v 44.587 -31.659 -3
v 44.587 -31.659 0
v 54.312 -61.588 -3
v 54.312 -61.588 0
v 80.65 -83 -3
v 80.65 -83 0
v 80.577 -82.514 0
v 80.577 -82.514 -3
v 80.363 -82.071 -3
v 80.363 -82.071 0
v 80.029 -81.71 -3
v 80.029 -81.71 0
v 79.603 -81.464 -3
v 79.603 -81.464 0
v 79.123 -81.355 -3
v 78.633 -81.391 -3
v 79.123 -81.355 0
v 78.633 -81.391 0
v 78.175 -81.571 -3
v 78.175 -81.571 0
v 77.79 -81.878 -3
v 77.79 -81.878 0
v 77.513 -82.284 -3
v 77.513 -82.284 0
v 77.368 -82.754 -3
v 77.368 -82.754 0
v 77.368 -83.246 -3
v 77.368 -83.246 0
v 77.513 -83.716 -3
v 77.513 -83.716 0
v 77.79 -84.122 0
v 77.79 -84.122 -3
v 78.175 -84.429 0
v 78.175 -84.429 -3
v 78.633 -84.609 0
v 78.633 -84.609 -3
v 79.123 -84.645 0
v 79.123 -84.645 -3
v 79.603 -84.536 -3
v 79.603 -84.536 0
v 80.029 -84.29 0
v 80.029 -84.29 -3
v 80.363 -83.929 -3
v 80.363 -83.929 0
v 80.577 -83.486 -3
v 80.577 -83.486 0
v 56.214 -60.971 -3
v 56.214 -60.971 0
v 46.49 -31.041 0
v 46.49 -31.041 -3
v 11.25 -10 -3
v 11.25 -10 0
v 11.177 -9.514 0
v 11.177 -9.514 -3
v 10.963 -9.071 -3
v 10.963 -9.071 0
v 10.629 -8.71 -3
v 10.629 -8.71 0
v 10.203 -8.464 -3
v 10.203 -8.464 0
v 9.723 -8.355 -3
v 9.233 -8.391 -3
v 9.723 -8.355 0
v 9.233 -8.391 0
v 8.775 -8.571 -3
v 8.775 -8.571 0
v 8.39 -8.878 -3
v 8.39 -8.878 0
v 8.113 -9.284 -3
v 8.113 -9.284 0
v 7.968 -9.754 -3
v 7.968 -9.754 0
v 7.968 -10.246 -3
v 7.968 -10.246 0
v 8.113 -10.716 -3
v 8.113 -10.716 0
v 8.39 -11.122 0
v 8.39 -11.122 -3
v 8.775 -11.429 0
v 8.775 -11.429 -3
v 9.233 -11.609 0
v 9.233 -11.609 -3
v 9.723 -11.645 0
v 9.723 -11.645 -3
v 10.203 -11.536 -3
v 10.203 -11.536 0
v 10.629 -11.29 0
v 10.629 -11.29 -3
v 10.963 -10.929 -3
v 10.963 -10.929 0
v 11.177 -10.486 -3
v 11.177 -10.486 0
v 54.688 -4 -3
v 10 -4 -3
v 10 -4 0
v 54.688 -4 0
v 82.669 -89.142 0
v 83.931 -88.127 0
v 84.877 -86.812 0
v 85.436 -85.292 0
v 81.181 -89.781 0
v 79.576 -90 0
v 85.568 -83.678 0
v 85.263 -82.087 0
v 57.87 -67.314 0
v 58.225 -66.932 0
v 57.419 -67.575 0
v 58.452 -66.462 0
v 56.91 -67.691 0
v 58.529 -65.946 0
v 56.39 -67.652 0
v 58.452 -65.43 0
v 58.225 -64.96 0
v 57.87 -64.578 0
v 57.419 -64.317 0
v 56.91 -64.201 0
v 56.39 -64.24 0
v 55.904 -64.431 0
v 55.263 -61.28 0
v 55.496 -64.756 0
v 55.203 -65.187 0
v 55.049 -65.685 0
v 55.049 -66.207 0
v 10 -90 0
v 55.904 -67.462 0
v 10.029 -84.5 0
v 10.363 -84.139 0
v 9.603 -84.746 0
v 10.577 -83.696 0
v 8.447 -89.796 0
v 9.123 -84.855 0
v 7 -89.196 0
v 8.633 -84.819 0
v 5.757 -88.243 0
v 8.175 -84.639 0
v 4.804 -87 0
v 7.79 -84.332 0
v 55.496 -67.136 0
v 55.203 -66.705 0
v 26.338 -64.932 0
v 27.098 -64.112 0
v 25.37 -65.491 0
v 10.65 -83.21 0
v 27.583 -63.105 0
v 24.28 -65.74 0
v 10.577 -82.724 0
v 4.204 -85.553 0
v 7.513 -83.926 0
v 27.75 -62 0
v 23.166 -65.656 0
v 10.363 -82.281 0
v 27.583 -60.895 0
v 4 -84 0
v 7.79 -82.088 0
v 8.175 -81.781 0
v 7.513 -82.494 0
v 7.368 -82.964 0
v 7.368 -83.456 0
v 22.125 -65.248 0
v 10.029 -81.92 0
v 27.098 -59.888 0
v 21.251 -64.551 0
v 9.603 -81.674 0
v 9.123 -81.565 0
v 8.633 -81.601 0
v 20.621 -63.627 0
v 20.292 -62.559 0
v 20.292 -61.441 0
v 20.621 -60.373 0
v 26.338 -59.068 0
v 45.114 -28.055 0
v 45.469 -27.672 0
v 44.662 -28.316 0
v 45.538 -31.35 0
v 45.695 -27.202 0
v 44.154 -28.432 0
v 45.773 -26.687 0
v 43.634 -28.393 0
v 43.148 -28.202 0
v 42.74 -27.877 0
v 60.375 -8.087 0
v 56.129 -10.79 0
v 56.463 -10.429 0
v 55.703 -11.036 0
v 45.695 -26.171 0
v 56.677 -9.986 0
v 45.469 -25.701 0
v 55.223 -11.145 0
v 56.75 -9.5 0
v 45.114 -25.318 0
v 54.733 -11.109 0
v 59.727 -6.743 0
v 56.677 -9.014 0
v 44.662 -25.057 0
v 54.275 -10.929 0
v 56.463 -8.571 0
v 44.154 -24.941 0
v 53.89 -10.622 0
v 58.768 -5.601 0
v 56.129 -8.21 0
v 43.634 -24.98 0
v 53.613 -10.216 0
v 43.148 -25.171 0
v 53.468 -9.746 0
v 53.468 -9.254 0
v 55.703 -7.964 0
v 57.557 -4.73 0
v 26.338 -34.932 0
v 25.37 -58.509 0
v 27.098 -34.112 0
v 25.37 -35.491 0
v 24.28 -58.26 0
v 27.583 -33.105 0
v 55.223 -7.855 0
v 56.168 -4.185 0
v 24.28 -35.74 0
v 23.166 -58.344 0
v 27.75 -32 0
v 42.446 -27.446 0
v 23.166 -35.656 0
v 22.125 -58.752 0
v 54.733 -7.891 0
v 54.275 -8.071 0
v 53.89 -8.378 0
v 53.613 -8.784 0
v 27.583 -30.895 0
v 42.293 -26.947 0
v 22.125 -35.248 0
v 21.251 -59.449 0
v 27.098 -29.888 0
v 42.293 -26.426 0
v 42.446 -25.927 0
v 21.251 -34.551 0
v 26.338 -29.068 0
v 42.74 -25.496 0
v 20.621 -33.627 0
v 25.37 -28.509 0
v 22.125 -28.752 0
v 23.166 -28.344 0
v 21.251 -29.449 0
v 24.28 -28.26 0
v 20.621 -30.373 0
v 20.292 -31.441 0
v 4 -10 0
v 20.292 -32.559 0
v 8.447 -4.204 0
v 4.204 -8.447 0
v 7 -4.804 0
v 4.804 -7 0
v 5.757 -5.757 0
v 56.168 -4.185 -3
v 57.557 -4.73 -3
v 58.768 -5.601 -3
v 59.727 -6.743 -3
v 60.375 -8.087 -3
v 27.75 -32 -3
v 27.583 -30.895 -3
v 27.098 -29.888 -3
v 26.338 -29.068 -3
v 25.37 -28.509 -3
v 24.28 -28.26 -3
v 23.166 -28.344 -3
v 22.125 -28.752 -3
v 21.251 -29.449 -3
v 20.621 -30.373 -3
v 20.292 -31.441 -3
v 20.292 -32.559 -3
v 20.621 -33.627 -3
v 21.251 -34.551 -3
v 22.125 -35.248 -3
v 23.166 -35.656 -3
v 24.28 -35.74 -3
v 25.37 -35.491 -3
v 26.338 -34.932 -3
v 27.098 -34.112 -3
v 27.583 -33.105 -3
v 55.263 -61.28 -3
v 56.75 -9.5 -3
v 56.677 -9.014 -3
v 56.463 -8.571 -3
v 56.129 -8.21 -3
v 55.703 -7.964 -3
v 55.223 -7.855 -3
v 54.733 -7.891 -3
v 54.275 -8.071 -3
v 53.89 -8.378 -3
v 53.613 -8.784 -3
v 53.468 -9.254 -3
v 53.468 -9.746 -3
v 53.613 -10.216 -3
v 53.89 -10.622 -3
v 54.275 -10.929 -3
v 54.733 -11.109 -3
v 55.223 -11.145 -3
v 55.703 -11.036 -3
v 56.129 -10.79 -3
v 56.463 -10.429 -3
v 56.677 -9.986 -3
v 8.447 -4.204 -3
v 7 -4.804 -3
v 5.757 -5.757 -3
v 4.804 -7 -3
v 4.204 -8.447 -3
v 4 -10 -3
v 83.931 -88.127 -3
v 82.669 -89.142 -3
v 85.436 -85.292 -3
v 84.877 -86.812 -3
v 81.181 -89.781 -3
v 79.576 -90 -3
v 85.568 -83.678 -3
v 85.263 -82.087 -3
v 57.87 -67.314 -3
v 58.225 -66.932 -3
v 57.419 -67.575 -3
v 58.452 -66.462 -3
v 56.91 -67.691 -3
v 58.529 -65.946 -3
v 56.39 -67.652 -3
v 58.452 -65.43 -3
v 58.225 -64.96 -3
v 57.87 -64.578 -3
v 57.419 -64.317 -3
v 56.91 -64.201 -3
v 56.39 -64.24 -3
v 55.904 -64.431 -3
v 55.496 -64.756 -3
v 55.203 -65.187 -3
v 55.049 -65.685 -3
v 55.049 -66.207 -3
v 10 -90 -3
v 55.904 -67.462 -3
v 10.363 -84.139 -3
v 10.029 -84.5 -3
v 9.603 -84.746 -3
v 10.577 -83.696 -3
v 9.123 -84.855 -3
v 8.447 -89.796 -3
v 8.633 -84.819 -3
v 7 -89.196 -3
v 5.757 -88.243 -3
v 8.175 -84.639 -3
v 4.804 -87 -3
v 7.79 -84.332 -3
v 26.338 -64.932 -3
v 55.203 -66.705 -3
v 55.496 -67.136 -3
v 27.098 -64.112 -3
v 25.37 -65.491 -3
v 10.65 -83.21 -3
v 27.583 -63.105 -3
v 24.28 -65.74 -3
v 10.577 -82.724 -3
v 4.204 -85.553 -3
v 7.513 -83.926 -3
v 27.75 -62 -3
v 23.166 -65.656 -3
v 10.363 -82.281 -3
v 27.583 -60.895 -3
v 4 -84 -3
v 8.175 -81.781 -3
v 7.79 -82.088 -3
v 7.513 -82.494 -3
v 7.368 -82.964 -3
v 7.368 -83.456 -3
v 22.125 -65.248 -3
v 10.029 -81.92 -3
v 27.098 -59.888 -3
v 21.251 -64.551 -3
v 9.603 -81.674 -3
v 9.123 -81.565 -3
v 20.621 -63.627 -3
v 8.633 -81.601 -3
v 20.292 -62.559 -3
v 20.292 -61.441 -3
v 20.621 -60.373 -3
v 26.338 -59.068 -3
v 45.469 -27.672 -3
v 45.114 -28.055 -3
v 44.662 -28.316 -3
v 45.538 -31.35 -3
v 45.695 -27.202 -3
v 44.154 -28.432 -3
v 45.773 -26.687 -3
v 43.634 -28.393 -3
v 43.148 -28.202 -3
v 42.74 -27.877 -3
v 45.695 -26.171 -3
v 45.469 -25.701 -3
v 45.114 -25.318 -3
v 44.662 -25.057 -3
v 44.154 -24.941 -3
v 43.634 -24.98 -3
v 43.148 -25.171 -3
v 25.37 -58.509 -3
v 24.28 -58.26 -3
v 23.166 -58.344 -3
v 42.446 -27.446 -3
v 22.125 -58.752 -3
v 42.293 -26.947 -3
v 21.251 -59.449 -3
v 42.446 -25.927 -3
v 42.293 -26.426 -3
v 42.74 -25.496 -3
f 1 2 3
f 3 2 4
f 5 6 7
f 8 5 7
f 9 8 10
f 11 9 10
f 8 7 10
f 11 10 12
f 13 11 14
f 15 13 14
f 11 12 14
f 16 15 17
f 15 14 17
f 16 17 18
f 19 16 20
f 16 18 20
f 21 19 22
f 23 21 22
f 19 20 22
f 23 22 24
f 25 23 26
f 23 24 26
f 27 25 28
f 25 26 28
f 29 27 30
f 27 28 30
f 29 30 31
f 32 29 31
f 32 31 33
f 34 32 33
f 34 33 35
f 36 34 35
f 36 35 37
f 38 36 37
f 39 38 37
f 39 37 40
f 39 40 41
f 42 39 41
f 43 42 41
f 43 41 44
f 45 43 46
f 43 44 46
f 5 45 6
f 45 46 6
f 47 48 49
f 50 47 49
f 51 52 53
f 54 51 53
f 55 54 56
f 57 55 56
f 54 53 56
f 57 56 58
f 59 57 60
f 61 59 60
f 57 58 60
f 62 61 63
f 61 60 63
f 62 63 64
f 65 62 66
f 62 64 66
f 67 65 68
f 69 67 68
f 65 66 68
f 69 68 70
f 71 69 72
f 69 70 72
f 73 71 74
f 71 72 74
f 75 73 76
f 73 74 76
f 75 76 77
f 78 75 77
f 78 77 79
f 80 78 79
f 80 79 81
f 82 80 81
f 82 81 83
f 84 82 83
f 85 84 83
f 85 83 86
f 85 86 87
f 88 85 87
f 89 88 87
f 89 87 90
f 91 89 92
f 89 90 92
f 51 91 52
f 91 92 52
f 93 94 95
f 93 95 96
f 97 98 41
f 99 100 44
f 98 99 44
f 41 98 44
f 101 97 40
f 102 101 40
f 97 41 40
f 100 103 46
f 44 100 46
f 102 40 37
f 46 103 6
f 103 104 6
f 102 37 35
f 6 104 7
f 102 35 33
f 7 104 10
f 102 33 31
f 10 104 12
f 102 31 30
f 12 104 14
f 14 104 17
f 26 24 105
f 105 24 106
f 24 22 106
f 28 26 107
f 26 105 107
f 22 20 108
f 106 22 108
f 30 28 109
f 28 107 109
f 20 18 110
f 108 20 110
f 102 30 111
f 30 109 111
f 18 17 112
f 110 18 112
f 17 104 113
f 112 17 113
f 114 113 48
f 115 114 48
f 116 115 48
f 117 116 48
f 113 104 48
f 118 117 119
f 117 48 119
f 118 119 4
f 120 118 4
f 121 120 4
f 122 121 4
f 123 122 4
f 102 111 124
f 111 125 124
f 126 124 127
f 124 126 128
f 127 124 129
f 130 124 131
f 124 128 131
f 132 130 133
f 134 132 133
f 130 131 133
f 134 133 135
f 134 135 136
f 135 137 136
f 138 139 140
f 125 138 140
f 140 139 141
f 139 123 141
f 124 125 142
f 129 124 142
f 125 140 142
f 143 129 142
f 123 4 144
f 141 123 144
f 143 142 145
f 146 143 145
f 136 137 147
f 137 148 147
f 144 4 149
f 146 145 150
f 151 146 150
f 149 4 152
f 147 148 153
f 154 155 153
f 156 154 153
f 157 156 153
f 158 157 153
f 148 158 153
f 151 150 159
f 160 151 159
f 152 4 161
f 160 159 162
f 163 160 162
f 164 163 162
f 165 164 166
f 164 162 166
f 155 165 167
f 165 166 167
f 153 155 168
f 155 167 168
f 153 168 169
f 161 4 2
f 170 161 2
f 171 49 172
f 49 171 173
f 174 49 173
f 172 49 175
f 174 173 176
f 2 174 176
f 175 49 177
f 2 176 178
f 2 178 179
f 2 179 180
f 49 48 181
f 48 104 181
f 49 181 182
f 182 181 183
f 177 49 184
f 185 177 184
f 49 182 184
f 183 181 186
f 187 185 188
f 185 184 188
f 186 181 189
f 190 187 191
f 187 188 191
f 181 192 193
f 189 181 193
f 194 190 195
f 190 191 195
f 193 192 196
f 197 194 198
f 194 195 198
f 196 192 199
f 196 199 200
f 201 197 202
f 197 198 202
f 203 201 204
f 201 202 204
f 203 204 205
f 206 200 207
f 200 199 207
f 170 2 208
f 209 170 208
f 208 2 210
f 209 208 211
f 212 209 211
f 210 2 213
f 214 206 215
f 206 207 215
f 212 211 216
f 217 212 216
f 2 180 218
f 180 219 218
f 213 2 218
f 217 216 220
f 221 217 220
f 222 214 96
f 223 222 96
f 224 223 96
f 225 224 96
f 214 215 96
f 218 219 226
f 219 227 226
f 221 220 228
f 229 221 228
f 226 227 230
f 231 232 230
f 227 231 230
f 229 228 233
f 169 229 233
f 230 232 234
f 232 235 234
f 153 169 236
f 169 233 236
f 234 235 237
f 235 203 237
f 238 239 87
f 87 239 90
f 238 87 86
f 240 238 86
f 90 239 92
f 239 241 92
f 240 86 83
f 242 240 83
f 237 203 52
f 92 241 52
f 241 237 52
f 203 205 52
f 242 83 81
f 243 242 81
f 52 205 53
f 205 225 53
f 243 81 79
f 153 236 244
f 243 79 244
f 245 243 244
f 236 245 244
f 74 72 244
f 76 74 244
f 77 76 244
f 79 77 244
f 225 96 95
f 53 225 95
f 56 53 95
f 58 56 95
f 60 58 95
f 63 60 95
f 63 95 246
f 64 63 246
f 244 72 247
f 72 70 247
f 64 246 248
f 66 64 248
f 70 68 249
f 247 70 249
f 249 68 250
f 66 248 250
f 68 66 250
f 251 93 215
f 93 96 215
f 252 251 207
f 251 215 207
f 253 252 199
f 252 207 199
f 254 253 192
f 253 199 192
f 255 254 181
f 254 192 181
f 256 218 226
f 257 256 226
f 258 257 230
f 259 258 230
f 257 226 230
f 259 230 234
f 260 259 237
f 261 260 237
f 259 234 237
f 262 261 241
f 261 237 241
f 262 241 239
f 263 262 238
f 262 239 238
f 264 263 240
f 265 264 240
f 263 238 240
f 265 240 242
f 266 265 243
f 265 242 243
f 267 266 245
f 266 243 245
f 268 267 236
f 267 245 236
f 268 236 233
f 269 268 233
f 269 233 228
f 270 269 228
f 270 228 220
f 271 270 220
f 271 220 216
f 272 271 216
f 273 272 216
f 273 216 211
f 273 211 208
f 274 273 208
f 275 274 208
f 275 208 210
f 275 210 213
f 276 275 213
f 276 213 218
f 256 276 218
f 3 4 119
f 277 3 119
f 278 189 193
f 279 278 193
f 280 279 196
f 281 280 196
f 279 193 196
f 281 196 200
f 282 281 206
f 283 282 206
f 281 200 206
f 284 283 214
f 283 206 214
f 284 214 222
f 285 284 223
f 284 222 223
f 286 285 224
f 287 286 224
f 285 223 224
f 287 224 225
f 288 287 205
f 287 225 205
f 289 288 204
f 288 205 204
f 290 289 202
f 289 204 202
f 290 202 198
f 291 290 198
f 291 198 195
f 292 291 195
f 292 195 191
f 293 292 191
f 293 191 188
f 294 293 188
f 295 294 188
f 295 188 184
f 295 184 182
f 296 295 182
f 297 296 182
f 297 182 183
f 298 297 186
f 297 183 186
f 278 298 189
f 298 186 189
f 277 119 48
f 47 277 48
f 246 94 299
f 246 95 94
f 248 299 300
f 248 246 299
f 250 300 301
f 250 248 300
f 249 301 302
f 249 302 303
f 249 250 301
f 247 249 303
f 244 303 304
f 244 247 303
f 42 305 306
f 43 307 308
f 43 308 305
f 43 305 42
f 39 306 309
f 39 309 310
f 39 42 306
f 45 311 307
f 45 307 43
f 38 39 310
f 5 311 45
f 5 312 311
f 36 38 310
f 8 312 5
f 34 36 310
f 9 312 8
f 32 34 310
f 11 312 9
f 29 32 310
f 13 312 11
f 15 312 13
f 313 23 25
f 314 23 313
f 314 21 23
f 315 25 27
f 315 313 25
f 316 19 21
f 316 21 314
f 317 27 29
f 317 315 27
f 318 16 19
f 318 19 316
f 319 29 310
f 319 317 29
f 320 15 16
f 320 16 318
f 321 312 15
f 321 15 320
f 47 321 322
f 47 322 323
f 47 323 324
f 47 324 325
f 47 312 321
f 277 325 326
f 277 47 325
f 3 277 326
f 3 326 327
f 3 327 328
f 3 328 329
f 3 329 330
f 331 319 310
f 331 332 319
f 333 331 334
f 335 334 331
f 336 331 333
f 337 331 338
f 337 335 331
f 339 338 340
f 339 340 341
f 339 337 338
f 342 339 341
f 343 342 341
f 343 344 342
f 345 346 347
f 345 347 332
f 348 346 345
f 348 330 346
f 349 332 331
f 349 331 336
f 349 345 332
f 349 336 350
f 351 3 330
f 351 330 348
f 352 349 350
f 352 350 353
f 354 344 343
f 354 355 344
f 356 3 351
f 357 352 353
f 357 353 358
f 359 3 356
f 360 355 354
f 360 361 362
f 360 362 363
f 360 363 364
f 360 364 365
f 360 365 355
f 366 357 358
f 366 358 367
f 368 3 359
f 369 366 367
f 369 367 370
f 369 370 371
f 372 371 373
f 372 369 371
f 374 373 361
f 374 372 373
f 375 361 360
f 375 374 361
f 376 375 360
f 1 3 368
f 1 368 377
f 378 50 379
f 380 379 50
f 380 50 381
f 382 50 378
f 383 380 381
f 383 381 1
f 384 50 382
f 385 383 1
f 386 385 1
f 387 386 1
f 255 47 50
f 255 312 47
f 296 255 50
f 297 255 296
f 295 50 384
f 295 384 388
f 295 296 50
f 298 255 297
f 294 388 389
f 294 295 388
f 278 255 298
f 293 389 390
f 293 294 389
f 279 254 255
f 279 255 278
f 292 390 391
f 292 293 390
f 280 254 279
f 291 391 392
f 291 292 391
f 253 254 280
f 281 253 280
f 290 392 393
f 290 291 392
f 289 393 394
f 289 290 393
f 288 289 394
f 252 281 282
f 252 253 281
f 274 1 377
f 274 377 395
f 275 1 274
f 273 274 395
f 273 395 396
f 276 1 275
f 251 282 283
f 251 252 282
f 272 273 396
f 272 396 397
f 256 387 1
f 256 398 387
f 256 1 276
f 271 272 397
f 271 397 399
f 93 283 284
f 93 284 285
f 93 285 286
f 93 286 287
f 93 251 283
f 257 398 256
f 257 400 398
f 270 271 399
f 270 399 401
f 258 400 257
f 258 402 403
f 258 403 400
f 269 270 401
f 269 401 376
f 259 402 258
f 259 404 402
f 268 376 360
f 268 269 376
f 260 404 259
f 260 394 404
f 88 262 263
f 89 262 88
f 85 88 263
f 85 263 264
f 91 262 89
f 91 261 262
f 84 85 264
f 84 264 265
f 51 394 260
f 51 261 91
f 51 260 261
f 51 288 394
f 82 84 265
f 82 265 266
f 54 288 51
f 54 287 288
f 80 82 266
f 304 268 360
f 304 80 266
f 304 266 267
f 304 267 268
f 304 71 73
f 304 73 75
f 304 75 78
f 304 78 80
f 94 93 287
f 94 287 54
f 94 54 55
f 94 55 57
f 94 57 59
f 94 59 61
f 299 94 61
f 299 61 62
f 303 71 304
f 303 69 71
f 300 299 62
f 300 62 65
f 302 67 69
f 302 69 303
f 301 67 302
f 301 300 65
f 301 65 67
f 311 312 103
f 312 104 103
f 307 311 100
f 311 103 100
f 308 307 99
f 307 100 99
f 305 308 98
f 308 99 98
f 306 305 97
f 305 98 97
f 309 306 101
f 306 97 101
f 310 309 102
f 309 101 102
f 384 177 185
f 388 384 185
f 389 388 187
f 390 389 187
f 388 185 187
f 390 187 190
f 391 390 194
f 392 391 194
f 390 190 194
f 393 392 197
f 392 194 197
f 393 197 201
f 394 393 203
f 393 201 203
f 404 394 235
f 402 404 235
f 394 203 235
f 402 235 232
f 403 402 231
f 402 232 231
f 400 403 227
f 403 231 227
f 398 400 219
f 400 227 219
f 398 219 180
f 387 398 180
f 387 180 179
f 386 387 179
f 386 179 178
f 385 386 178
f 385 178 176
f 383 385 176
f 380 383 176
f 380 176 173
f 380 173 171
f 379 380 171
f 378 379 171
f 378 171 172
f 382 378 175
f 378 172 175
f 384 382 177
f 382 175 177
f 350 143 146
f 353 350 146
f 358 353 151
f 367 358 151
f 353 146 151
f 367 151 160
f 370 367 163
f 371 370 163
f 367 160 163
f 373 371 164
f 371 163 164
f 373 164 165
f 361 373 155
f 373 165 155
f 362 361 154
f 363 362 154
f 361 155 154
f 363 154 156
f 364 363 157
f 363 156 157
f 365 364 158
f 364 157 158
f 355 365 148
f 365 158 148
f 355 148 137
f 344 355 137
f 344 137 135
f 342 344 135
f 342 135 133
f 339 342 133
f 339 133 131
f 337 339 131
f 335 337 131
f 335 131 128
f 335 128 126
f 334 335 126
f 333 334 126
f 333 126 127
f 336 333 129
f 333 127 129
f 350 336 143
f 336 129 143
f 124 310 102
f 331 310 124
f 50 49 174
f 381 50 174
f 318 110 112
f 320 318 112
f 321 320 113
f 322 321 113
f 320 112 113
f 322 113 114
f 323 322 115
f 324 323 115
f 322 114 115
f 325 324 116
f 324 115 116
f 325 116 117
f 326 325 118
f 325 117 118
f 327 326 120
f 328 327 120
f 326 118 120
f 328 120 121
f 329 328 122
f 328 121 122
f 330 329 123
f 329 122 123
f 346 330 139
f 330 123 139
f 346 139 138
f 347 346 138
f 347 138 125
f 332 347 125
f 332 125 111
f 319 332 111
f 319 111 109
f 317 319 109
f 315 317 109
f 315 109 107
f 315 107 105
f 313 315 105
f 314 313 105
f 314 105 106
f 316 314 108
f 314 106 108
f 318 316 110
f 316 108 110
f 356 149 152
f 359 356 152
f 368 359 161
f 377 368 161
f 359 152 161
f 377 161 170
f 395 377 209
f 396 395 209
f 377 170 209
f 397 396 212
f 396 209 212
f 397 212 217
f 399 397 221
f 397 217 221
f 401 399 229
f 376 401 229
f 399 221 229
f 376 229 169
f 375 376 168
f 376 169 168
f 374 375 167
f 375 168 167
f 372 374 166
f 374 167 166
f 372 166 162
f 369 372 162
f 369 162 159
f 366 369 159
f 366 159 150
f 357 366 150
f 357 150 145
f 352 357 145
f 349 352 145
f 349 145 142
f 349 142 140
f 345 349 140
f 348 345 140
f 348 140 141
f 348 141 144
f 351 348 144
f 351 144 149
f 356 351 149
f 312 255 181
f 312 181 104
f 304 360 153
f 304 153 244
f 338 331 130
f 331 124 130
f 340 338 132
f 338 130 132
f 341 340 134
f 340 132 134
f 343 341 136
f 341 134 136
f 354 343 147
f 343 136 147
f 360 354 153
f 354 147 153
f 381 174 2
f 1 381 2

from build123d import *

# Parameters (mm, degrees)
PAD004_DEPTH    = 3
FILLET016_R     = 6
SKETCH144_R     = 3.75
POCKET031_DEPTH = 5
SKETCH145_R     = 1.75
POCKET058_DEPTH = 3
SKETCH191_R     = 1.65
POCKET060_DEPTH = 3


with BuildPart() as part:
    # Sketch143 → Pad004 (new body)
    with BuildSketch(Plane.XY.offset(45)):
        Polygon((282.000003, 258), (337, 258), (365.924584, 172), (282.000003, 172), align=None)
    extrude(amount=PAD004_DEPTH)

    # Fillet016
    fillet016_edges = [part.edges().sort_by_distance(p)[0] for p in [
        (365.924584, 172, 46.5),
        (282.000003, 172, 46.5),
        (282.000003, 258, 46.5),
        (337, 258, 46.5),
    ]]
    fillet(fillet016_edges, radius=FILLET016_R)

    # Sketch144 (on Face5 of Fillet016) → Pocket031 (cut)
    with BuildSketch(Plane.XY.offset(48)):
        with Locations((302, 230)):
            Circle(SKETCH144_R)
        with Locations((302.000005, 200.000003)):
            Circle(SKETCH144_R)
    extrude(amount=-POCKET031_DEPTH, mode=Mode.SUBTRACT)

    # Sketch145 (on Face5 of Pocket031) → Pocket058 (cut)
    with BuildSketch(Plane.XY.offset(48)):
        with Locations((322.023093, 235.313475)):
            Circle(SKETCH145_R)
        with Locations((334.779262, 196.053817)):
            Circle(SKETCH145_R)
        Polygon((333.263016, 200.720368), (334.214123, 201.029229), (324.489542, 230.958564), (323.538485, 230.649553), (322.587428, 230.340537), (332.311908, 200.411506), align=None)
    extrude(amount=-POCKET058_DEPTH, mode=Mode.SUBTRACT)

    # Sketch191 (on Face5 of Pocket058) → Pocket060 (cut)
    with BuildSketch(Plane.XY.offset(48)):
        with Locations((286.999994, 178.789996)):
            Circle(SKETCH191_R)
        with Locations((287.600004, 252.000004)):
            Circle(SKETCH191_R)
        with Locations((333.100005, 252.500004)):
            Circle(SKETCH191_R)
        with Locations((357, 179)):
            Circle(SKETCH191_R)
    extrude(amount=-POCKET060_DEPTH, mode=Mode.SUBTRACT)


with BuildPart() as part_1:
    # Body015 placement: moved
    add(part.part.moved(Location((0, 0, -2.9))))


with BuildPart() as part_2:
    # Clone placement: moved
    add(part_1.part.moved(Location((-278.000003, -262, -45.1))))


solid = part_2.part
